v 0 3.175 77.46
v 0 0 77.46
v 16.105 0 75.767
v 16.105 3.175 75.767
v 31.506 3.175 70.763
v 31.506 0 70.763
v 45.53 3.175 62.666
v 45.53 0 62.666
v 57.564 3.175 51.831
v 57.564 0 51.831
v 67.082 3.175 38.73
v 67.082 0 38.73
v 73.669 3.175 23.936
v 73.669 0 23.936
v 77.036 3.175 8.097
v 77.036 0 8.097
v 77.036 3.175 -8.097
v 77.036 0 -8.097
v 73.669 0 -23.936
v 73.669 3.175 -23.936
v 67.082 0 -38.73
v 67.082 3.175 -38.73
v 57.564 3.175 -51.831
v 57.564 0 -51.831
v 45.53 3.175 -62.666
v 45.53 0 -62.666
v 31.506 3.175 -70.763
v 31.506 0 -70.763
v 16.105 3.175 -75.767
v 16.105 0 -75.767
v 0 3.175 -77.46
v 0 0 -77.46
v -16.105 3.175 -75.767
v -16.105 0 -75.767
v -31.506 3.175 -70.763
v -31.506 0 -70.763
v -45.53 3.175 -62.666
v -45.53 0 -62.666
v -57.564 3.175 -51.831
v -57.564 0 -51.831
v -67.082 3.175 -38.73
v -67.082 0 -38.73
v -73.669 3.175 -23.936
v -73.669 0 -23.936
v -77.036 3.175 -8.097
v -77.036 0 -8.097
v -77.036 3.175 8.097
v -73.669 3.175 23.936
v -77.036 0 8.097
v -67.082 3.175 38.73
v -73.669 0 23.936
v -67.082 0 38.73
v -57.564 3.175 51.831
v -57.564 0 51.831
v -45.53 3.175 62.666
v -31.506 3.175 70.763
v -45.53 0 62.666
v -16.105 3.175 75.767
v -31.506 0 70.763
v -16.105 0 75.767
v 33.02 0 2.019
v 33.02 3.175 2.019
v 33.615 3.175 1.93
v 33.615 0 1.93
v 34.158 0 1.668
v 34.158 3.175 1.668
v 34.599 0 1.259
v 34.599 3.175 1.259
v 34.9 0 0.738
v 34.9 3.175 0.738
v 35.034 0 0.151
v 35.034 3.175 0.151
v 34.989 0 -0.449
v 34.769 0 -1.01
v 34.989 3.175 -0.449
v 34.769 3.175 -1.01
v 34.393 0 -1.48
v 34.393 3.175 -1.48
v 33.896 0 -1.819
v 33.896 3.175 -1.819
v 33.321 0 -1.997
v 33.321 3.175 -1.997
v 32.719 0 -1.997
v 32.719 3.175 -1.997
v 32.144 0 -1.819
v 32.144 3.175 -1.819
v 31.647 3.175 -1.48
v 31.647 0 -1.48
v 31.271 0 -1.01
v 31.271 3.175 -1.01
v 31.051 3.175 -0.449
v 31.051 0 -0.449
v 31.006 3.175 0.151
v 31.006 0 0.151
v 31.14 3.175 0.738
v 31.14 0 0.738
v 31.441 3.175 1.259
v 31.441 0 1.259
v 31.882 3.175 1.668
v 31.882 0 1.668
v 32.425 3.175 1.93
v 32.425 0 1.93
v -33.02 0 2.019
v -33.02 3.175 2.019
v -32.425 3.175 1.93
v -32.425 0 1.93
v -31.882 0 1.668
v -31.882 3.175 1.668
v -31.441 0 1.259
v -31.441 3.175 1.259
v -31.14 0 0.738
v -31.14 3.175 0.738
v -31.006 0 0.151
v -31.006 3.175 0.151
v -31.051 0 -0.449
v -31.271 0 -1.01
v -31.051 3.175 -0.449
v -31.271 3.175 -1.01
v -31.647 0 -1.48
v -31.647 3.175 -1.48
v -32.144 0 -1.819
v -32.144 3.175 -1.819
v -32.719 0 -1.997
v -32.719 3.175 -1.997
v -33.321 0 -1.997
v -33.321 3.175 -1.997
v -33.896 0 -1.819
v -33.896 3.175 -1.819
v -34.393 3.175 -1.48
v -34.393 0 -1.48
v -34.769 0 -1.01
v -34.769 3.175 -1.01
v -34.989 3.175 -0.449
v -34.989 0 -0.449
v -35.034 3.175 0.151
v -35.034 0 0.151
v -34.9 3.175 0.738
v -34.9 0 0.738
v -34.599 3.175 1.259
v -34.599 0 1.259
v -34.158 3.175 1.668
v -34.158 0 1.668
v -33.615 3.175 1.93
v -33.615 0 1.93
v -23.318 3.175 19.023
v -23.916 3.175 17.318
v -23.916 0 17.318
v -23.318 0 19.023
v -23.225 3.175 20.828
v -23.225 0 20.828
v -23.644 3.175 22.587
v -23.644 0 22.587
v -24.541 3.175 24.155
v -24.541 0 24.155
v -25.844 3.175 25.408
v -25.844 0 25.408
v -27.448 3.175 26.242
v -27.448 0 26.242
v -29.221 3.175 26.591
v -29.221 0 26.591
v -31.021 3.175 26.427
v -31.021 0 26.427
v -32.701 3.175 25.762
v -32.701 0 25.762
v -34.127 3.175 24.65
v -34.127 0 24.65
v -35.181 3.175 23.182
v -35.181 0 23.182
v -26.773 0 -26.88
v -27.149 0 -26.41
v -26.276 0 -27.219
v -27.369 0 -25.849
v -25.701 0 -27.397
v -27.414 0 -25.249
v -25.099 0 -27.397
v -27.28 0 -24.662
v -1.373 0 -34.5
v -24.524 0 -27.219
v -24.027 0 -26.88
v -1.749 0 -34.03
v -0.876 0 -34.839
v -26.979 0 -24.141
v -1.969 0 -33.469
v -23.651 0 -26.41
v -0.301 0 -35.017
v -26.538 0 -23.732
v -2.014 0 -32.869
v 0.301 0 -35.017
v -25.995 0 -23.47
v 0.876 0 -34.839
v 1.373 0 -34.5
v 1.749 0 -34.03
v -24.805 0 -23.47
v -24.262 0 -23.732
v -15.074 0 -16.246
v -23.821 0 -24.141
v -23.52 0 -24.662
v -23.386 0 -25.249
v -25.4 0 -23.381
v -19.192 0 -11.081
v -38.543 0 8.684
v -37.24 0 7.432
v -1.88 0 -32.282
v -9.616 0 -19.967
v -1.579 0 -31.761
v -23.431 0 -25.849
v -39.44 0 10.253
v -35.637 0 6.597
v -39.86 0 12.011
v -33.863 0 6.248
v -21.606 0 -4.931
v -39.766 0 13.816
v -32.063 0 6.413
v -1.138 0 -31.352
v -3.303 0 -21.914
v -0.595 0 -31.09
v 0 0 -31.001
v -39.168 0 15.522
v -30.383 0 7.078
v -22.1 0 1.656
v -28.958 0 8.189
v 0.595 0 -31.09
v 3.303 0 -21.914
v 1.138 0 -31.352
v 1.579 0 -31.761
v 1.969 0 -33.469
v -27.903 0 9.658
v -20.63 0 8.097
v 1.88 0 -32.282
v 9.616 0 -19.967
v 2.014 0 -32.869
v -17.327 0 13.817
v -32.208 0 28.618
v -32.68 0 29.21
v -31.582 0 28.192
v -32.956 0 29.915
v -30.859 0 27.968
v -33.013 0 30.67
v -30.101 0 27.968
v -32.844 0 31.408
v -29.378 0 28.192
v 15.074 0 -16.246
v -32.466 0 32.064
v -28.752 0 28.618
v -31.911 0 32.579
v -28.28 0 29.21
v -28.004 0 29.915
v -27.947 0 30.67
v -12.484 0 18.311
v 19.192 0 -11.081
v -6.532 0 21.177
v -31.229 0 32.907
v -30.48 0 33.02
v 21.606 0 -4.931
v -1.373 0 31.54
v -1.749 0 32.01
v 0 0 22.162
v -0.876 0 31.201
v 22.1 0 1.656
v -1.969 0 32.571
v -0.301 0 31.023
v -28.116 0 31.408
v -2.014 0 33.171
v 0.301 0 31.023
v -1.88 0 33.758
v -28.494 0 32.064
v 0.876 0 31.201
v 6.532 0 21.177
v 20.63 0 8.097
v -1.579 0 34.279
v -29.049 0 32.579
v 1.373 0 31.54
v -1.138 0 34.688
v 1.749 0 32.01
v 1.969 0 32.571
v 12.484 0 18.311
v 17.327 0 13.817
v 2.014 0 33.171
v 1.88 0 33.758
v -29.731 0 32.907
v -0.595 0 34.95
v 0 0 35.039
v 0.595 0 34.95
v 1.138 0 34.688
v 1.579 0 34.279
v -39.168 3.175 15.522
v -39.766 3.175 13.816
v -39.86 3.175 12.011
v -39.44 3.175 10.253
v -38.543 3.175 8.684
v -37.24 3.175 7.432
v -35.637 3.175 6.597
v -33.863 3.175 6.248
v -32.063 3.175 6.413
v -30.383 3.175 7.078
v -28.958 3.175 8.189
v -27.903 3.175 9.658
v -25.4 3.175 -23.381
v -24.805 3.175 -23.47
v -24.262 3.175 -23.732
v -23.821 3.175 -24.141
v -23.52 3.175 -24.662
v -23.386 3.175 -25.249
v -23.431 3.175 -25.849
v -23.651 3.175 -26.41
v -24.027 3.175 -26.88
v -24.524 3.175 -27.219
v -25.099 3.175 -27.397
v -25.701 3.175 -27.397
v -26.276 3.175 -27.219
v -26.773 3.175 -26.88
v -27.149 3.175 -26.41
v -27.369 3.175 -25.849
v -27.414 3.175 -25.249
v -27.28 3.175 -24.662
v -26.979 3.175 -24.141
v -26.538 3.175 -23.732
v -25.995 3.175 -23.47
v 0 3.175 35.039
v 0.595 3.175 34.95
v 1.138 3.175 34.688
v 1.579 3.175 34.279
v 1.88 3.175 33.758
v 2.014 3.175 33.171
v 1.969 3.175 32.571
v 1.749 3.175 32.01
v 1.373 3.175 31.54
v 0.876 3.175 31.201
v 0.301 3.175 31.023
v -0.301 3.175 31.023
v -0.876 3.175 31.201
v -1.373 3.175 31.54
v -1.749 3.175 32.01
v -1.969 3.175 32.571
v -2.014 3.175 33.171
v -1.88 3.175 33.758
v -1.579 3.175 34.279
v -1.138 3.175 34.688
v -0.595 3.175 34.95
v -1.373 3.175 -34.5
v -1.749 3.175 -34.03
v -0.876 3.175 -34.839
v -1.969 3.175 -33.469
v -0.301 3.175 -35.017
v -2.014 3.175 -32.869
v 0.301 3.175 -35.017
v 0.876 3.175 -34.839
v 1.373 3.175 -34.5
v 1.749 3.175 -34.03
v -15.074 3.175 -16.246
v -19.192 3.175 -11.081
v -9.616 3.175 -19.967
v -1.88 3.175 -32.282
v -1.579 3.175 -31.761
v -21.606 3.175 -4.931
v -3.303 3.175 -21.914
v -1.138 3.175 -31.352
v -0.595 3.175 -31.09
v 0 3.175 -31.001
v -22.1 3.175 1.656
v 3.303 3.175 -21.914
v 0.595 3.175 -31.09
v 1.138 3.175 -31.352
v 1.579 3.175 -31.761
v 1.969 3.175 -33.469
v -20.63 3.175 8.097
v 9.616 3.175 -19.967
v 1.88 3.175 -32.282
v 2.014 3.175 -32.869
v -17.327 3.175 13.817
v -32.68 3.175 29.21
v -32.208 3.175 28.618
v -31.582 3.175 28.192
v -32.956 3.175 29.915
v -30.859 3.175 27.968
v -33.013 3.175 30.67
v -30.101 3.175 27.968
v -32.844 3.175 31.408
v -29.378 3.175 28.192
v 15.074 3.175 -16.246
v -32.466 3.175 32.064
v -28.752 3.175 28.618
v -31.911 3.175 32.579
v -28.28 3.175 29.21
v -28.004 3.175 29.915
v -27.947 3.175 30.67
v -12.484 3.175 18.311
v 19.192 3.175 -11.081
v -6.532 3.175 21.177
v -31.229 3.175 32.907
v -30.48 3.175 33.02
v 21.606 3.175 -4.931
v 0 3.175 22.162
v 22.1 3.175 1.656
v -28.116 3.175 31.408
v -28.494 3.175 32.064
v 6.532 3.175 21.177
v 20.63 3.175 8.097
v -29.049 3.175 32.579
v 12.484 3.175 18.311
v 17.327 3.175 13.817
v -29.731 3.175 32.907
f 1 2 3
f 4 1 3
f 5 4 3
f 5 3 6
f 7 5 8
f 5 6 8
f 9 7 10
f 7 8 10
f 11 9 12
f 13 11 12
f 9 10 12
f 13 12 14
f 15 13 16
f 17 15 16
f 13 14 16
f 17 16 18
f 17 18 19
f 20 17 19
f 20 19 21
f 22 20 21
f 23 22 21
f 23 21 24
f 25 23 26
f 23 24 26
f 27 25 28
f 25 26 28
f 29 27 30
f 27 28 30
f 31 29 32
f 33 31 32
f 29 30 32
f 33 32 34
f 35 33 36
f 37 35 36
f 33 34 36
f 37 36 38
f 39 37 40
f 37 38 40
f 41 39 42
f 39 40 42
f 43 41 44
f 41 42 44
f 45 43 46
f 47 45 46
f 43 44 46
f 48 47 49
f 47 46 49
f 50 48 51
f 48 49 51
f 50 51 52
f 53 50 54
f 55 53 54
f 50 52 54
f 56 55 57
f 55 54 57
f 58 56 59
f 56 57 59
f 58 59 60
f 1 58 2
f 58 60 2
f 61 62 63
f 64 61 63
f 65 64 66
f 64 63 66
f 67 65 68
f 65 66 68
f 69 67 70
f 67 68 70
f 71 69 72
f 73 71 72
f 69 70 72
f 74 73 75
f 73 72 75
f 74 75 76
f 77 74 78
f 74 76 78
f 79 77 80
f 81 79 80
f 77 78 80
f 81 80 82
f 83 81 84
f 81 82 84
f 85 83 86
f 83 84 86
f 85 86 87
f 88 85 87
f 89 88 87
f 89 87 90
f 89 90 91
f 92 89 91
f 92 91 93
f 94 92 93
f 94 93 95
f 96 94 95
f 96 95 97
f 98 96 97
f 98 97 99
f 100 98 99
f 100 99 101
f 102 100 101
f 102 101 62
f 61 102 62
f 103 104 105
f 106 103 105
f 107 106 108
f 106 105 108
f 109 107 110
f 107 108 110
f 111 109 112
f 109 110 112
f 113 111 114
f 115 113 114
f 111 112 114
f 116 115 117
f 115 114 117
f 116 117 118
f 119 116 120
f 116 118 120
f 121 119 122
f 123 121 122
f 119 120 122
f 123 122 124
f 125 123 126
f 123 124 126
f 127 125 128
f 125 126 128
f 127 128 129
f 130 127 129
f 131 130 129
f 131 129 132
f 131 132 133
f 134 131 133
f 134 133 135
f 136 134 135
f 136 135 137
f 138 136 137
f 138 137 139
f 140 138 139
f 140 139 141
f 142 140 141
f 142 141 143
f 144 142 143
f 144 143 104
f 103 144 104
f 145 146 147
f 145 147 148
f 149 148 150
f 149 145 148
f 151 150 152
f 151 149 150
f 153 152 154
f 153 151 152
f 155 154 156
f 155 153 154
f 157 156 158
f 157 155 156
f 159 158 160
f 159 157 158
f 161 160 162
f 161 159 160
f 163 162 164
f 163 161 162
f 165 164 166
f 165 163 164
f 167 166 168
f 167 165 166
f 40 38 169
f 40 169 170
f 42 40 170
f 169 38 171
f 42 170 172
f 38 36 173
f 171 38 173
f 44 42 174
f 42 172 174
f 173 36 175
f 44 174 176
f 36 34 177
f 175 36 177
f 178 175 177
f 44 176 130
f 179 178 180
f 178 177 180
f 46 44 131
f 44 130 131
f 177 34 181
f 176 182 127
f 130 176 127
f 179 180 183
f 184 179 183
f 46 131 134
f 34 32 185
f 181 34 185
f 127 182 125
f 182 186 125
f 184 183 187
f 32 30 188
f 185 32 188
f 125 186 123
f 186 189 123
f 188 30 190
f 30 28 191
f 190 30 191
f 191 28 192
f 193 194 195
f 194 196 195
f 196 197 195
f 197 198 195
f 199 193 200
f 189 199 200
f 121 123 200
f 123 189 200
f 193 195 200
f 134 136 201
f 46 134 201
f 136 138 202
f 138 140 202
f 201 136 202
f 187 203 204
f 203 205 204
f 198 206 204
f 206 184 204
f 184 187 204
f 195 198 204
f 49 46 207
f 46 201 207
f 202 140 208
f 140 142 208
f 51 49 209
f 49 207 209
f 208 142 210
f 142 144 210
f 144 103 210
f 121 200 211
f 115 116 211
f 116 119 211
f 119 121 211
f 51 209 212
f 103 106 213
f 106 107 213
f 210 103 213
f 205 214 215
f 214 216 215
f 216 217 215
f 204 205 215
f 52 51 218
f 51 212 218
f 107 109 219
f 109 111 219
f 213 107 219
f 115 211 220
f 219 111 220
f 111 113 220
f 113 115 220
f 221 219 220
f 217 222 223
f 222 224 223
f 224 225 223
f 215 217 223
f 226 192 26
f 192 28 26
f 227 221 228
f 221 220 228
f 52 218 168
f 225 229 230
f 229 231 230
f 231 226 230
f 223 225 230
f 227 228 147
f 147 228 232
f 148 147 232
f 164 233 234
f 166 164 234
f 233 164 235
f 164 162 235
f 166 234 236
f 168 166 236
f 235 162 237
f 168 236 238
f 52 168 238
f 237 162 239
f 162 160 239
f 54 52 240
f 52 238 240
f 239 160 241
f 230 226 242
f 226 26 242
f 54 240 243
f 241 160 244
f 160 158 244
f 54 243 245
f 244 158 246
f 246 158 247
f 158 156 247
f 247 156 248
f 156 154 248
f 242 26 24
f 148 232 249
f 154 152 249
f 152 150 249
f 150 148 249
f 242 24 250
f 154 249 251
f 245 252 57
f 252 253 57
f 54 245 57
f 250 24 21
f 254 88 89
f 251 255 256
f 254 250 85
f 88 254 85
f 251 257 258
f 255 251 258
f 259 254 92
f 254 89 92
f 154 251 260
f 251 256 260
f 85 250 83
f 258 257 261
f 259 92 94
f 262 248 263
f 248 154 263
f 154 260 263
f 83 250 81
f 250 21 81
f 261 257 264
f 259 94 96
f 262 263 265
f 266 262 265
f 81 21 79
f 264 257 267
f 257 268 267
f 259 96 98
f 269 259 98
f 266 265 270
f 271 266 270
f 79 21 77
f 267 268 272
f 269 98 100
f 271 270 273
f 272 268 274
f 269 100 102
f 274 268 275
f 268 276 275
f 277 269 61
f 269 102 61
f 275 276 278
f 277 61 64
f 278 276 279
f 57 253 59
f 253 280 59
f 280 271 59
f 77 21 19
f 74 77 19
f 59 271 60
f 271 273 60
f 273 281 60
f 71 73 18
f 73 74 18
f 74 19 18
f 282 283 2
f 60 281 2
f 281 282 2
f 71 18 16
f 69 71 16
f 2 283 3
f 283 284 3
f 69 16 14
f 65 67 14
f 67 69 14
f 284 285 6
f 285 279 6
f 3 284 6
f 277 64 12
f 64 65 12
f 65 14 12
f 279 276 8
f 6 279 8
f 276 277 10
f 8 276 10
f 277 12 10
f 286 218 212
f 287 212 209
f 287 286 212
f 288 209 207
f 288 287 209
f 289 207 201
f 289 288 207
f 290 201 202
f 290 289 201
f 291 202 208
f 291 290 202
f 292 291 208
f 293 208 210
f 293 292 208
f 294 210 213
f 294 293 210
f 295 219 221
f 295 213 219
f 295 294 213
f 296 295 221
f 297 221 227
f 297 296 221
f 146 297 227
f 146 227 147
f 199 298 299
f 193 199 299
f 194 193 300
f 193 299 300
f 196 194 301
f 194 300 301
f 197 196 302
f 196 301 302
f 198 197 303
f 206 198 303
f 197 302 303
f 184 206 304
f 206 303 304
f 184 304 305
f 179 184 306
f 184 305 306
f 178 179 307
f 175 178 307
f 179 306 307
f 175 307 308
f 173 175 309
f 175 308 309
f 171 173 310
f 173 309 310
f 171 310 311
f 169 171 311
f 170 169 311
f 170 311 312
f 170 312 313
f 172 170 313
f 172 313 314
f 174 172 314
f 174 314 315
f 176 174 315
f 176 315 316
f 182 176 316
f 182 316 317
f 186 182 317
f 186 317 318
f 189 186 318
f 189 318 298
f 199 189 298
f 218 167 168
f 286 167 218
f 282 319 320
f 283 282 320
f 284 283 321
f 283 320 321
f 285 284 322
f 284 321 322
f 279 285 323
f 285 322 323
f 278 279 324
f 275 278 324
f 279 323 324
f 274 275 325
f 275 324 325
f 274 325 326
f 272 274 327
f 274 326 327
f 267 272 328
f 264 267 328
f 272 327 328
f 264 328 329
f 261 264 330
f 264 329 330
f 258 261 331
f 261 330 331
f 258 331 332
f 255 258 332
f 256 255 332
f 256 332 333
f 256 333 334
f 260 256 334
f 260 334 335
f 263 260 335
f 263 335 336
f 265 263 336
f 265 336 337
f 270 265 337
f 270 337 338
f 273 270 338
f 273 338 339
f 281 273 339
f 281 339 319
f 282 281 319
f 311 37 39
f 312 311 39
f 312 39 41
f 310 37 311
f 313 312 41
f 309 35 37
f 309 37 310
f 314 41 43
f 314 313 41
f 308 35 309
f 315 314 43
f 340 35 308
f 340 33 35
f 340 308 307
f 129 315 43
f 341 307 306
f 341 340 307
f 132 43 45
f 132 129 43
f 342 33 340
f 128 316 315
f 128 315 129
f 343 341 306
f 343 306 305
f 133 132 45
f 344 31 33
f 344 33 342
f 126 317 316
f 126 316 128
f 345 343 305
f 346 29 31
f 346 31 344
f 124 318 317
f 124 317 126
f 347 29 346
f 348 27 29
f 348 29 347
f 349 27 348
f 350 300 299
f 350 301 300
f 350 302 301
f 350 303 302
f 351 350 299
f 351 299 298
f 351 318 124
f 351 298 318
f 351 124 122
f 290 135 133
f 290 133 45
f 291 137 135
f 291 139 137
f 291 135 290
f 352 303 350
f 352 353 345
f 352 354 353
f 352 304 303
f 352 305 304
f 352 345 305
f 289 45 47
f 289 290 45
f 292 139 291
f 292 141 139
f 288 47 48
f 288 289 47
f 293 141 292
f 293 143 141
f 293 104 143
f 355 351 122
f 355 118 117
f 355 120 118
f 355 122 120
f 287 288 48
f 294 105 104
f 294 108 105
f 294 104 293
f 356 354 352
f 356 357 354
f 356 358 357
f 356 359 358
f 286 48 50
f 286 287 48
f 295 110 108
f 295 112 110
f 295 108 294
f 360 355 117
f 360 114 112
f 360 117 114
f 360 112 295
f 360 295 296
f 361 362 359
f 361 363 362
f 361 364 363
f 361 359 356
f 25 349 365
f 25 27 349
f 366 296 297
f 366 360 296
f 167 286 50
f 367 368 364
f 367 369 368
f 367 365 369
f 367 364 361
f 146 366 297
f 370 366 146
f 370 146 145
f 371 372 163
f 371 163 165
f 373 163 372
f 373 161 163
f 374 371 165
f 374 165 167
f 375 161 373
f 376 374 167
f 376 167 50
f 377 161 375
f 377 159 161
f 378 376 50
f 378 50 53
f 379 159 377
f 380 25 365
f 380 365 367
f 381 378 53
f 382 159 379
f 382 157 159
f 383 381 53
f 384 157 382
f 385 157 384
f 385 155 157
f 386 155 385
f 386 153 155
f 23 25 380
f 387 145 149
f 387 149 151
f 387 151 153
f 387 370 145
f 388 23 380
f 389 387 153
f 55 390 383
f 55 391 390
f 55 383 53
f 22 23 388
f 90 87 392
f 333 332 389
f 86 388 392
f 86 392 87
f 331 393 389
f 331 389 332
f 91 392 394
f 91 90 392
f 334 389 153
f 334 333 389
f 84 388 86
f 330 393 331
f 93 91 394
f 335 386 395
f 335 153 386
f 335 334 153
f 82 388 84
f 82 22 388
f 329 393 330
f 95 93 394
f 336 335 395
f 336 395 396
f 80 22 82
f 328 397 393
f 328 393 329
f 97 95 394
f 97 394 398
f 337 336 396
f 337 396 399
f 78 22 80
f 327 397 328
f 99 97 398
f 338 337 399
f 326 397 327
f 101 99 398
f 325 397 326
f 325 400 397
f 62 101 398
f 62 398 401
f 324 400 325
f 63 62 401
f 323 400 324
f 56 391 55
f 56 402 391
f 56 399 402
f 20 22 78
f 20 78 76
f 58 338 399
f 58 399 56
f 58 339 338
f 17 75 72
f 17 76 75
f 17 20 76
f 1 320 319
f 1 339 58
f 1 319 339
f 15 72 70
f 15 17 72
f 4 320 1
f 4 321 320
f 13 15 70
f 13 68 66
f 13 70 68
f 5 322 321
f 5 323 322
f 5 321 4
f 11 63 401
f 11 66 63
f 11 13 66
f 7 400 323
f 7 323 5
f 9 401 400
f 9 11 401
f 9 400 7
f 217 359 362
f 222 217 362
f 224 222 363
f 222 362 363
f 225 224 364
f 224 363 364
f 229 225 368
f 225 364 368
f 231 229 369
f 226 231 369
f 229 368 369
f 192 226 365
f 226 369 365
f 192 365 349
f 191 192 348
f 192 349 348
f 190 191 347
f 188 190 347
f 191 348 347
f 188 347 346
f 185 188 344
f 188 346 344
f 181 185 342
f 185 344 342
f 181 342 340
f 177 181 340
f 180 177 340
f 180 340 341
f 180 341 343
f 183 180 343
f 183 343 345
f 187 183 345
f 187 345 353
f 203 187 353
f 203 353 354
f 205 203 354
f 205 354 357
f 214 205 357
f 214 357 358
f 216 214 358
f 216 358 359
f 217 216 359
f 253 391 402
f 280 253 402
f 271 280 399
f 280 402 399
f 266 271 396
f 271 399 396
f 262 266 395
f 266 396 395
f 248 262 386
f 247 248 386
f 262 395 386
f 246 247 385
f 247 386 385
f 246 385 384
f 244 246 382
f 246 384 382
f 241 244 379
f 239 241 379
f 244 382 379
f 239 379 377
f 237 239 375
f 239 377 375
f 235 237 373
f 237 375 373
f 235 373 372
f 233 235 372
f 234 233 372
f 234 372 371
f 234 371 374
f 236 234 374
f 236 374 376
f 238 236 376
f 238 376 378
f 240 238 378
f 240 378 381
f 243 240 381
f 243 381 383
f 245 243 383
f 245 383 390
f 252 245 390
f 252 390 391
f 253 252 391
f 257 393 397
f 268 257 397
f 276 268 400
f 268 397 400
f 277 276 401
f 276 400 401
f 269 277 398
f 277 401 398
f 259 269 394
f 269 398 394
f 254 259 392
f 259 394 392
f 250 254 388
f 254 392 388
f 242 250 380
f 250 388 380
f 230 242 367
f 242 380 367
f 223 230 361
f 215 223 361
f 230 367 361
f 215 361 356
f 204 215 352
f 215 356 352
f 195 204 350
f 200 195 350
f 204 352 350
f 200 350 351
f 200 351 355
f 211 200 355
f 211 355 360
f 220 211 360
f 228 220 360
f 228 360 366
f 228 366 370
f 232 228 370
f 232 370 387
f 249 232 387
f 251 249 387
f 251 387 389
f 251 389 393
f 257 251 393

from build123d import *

# Parameters (mm, degrees)
SKETCH1_R           = 77.4600051
BOSS_EXTRUDE1_DEPTH = 3.175
SKETCH24_R          = 22.1615
SKETCH24_R_2        = 2.0193
SKETCH24_R_3        = 2.54
CUT_EXTRUDE14_DEPTH = 110.590991442


with BuildPart() as part:
    # Sketch1 → Boss-Extrude1 (new body)
    with BuildSketch(Plane(origin=(0, 0, 0), x_dir=(1, 0, 0), z_dir=(0, 1, 0))):
        with Locations(Location((0, 0, 0), (0, 0, 270))):
            Circle(SKETCH1_R)
    extrude(amount=BOSS_EXTRUDE1_DEPTH)

    # Sketch24 → Cut-Extrude14 (cut, through all)
    with BuildSketch(Plane(origin=(0, 3.175, 0), x_dir=(1, 0, 0), z_dir=(0, 1, 0))):
        with Locations(Location((0, 0, 0), (0, 0, 270))):
            Circle(SKETCH24_R)
        with Locations(Location((0, 33.02, 0), (0, 0, 270))):
            Circle(SKETCH24_R_2)
        with Locations(Location((33.02, 0, 0), (0, 0, 270))):
            Circle(SKETCH24_R_2)
        with Locations(Location((-33.02, 0, 0), (0, 0, 270))):
            Circle(SKETCH24_R_2)
        with Locations(Location((0, -33.02, 0), (0, 0, 270))):
            Circle(SKETCH24_R_2)
        with Locations(Location((-30.48, -30.48, 0), (0, 0, 270))):
            Circle(SKETCH24_R_3)
        with Locations(Location((-25.4, 25.4, 0), (0, 0, 270))):
            Circle(SKETCH24_R_2)
        with BuildLine():
            Line((-27.903416949, -9.657564215), (-23.915755925, -17.31778977))
            ThreePointArc((-23.915755925, -17.31778977), (-26.616171022, -25.882412255), (-35.180793507, -23.181997158))
            Line((-35.180793507, -23.181997158), (-39.16845453, -15.521771603))
            ThreePointArc((-39.16845453, -15.521771603), (-36.468039434, -6.957149118), (-27.903416949, -9.657564215))
        make_face()
    extrude(amount=-CUT_EXTRUDE14_DEPTH, mode=Mode.SUBTRACT)


solid = part.part
